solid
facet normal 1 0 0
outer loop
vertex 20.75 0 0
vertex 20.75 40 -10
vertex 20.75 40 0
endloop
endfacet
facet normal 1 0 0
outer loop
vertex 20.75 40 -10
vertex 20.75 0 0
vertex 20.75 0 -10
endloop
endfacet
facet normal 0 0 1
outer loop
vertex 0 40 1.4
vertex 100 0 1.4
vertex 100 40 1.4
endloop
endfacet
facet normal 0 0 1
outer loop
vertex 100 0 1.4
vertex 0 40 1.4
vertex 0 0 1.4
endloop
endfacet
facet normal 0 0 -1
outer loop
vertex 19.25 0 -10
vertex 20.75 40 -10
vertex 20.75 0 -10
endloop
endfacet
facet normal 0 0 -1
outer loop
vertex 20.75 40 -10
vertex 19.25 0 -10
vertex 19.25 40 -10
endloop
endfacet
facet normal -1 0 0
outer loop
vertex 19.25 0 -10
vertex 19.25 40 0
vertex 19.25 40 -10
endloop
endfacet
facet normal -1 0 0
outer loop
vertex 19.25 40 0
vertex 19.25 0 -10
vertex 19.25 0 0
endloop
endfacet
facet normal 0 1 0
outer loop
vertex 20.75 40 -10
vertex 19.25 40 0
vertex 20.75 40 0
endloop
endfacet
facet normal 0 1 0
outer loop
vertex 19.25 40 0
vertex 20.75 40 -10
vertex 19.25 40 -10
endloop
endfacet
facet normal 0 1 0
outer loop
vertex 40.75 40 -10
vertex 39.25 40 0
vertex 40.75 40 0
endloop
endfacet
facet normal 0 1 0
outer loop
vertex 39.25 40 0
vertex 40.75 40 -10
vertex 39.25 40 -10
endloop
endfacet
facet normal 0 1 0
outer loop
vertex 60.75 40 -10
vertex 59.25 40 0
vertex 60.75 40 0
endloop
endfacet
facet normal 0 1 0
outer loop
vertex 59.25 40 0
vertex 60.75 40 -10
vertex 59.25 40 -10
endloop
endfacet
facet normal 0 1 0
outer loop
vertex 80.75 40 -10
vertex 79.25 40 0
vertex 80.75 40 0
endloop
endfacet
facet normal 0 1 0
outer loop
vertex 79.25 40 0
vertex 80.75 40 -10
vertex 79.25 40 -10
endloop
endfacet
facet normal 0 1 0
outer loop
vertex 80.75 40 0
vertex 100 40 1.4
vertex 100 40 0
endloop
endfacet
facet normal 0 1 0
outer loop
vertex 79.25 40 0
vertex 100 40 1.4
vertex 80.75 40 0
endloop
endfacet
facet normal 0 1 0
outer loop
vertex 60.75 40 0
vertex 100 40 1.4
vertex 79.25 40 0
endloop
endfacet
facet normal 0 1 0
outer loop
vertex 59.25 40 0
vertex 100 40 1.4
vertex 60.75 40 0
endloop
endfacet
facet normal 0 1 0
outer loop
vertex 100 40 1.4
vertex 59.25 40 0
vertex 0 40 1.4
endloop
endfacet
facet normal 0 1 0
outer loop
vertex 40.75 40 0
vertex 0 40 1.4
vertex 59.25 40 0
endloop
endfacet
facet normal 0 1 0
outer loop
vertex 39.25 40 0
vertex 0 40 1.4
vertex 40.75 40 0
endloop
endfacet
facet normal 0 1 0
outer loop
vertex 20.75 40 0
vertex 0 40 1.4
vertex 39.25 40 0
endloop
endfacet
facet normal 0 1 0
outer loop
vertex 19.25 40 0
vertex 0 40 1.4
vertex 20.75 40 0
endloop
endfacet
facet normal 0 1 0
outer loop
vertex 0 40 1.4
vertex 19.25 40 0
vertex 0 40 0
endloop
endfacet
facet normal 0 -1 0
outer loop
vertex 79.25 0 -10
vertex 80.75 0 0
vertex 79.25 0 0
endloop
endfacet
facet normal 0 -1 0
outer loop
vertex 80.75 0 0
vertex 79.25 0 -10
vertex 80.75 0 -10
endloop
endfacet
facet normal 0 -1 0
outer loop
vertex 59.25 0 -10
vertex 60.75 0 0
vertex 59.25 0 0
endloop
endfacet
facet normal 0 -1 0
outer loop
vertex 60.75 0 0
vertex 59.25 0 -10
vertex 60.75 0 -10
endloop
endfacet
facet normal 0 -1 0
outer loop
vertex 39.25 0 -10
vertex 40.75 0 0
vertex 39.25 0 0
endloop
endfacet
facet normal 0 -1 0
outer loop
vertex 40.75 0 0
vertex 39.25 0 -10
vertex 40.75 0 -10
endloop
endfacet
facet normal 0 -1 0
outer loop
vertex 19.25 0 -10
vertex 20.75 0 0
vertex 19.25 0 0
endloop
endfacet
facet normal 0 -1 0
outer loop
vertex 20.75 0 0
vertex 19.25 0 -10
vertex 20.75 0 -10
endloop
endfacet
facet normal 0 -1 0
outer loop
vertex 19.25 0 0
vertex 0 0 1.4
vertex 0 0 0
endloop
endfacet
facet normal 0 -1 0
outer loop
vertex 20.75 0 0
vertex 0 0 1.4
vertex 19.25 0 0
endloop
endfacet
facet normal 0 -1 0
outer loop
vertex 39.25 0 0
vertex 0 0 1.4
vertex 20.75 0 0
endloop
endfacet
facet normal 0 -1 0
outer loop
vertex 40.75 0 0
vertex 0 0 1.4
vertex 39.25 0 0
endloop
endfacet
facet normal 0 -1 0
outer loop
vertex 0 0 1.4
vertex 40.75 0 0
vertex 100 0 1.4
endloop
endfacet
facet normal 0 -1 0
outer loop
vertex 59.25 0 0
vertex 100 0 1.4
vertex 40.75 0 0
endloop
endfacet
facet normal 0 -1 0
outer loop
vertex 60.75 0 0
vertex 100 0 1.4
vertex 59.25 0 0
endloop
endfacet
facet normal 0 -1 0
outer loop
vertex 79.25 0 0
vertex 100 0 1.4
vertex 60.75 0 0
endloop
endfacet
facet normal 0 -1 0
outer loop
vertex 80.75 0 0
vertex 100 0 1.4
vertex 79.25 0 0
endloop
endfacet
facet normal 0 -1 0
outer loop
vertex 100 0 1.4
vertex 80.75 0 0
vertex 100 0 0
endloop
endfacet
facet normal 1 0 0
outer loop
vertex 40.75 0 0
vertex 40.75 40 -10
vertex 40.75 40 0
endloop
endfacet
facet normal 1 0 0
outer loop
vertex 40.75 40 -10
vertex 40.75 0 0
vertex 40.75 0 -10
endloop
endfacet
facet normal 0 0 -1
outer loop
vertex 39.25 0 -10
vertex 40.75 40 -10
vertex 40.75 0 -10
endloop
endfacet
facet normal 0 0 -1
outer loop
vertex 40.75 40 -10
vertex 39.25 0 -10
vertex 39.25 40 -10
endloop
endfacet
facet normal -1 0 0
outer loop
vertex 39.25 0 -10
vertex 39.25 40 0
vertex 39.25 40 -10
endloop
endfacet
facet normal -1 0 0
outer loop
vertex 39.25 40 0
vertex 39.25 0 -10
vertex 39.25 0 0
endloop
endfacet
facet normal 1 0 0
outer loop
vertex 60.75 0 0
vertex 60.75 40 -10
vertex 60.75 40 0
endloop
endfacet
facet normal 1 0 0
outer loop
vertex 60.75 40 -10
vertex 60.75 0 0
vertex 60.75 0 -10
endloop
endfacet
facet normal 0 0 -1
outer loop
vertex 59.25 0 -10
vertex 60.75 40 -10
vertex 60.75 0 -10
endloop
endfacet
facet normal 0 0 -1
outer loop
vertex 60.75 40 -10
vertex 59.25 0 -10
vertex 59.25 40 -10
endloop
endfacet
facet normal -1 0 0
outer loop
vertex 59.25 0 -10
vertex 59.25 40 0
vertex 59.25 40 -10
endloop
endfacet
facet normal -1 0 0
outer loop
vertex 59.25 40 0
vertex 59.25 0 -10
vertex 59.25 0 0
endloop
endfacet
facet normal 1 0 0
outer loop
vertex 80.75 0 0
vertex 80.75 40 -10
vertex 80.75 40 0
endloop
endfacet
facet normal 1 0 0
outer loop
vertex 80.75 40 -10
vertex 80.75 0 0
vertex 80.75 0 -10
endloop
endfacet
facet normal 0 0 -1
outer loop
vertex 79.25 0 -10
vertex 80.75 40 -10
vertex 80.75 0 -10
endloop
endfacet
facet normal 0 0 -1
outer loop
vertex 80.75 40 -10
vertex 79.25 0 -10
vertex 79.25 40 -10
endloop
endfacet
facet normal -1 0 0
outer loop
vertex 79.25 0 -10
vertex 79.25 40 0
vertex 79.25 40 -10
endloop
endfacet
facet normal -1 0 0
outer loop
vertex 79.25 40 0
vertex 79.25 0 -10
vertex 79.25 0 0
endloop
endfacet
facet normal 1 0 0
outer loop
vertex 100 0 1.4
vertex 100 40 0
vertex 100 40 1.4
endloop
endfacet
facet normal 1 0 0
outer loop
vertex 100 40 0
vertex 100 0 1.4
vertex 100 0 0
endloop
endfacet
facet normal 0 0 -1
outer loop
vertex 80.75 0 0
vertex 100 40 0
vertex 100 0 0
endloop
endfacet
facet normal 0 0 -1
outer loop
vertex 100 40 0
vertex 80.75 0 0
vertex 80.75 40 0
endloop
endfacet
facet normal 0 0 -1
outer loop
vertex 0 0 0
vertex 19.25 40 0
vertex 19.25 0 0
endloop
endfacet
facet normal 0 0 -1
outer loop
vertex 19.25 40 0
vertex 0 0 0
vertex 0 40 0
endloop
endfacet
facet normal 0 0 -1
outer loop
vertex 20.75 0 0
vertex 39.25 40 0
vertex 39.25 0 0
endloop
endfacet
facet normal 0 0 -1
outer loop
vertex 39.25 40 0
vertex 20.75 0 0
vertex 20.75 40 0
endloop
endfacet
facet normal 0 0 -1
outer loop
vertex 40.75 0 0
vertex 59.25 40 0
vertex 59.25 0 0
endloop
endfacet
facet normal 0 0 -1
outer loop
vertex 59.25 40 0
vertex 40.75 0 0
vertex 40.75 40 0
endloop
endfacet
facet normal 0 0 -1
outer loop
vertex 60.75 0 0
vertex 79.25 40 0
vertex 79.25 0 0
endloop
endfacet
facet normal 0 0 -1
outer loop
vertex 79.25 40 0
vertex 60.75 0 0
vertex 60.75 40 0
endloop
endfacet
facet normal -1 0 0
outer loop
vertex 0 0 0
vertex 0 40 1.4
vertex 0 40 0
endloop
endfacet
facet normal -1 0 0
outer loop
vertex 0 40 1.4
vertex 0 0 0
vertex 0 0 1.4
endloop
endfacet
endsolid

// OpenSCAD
$fn = 32;

// ----------------------------------------------------------------------
// Ribbed panel: 1.4 mm panel
// ----------------------------------------------------------------------

// --- parameters (mm) ---
panel_l = 100;            // panel length, X
panel_w = 40;             // panel width, Y
panel_t = 1.4;            // panel thickness, Z
rib_t = 1.5;              // rib thickness
rib_h = 10;               // rib height below the panel
ribs = 4;                 // number of ribs

total_h = panel_t + rib_h;  // overall height

union() {
  cube([panel_l, panel_w, panel_t]);
  for (i = [1 : ribs])
    translate([i * panel_l / (ribs + 1) - rib_t / 2, 0, -rib_h])
      cube([rib_t, panel_w, rib_h + panel_t]);
}
